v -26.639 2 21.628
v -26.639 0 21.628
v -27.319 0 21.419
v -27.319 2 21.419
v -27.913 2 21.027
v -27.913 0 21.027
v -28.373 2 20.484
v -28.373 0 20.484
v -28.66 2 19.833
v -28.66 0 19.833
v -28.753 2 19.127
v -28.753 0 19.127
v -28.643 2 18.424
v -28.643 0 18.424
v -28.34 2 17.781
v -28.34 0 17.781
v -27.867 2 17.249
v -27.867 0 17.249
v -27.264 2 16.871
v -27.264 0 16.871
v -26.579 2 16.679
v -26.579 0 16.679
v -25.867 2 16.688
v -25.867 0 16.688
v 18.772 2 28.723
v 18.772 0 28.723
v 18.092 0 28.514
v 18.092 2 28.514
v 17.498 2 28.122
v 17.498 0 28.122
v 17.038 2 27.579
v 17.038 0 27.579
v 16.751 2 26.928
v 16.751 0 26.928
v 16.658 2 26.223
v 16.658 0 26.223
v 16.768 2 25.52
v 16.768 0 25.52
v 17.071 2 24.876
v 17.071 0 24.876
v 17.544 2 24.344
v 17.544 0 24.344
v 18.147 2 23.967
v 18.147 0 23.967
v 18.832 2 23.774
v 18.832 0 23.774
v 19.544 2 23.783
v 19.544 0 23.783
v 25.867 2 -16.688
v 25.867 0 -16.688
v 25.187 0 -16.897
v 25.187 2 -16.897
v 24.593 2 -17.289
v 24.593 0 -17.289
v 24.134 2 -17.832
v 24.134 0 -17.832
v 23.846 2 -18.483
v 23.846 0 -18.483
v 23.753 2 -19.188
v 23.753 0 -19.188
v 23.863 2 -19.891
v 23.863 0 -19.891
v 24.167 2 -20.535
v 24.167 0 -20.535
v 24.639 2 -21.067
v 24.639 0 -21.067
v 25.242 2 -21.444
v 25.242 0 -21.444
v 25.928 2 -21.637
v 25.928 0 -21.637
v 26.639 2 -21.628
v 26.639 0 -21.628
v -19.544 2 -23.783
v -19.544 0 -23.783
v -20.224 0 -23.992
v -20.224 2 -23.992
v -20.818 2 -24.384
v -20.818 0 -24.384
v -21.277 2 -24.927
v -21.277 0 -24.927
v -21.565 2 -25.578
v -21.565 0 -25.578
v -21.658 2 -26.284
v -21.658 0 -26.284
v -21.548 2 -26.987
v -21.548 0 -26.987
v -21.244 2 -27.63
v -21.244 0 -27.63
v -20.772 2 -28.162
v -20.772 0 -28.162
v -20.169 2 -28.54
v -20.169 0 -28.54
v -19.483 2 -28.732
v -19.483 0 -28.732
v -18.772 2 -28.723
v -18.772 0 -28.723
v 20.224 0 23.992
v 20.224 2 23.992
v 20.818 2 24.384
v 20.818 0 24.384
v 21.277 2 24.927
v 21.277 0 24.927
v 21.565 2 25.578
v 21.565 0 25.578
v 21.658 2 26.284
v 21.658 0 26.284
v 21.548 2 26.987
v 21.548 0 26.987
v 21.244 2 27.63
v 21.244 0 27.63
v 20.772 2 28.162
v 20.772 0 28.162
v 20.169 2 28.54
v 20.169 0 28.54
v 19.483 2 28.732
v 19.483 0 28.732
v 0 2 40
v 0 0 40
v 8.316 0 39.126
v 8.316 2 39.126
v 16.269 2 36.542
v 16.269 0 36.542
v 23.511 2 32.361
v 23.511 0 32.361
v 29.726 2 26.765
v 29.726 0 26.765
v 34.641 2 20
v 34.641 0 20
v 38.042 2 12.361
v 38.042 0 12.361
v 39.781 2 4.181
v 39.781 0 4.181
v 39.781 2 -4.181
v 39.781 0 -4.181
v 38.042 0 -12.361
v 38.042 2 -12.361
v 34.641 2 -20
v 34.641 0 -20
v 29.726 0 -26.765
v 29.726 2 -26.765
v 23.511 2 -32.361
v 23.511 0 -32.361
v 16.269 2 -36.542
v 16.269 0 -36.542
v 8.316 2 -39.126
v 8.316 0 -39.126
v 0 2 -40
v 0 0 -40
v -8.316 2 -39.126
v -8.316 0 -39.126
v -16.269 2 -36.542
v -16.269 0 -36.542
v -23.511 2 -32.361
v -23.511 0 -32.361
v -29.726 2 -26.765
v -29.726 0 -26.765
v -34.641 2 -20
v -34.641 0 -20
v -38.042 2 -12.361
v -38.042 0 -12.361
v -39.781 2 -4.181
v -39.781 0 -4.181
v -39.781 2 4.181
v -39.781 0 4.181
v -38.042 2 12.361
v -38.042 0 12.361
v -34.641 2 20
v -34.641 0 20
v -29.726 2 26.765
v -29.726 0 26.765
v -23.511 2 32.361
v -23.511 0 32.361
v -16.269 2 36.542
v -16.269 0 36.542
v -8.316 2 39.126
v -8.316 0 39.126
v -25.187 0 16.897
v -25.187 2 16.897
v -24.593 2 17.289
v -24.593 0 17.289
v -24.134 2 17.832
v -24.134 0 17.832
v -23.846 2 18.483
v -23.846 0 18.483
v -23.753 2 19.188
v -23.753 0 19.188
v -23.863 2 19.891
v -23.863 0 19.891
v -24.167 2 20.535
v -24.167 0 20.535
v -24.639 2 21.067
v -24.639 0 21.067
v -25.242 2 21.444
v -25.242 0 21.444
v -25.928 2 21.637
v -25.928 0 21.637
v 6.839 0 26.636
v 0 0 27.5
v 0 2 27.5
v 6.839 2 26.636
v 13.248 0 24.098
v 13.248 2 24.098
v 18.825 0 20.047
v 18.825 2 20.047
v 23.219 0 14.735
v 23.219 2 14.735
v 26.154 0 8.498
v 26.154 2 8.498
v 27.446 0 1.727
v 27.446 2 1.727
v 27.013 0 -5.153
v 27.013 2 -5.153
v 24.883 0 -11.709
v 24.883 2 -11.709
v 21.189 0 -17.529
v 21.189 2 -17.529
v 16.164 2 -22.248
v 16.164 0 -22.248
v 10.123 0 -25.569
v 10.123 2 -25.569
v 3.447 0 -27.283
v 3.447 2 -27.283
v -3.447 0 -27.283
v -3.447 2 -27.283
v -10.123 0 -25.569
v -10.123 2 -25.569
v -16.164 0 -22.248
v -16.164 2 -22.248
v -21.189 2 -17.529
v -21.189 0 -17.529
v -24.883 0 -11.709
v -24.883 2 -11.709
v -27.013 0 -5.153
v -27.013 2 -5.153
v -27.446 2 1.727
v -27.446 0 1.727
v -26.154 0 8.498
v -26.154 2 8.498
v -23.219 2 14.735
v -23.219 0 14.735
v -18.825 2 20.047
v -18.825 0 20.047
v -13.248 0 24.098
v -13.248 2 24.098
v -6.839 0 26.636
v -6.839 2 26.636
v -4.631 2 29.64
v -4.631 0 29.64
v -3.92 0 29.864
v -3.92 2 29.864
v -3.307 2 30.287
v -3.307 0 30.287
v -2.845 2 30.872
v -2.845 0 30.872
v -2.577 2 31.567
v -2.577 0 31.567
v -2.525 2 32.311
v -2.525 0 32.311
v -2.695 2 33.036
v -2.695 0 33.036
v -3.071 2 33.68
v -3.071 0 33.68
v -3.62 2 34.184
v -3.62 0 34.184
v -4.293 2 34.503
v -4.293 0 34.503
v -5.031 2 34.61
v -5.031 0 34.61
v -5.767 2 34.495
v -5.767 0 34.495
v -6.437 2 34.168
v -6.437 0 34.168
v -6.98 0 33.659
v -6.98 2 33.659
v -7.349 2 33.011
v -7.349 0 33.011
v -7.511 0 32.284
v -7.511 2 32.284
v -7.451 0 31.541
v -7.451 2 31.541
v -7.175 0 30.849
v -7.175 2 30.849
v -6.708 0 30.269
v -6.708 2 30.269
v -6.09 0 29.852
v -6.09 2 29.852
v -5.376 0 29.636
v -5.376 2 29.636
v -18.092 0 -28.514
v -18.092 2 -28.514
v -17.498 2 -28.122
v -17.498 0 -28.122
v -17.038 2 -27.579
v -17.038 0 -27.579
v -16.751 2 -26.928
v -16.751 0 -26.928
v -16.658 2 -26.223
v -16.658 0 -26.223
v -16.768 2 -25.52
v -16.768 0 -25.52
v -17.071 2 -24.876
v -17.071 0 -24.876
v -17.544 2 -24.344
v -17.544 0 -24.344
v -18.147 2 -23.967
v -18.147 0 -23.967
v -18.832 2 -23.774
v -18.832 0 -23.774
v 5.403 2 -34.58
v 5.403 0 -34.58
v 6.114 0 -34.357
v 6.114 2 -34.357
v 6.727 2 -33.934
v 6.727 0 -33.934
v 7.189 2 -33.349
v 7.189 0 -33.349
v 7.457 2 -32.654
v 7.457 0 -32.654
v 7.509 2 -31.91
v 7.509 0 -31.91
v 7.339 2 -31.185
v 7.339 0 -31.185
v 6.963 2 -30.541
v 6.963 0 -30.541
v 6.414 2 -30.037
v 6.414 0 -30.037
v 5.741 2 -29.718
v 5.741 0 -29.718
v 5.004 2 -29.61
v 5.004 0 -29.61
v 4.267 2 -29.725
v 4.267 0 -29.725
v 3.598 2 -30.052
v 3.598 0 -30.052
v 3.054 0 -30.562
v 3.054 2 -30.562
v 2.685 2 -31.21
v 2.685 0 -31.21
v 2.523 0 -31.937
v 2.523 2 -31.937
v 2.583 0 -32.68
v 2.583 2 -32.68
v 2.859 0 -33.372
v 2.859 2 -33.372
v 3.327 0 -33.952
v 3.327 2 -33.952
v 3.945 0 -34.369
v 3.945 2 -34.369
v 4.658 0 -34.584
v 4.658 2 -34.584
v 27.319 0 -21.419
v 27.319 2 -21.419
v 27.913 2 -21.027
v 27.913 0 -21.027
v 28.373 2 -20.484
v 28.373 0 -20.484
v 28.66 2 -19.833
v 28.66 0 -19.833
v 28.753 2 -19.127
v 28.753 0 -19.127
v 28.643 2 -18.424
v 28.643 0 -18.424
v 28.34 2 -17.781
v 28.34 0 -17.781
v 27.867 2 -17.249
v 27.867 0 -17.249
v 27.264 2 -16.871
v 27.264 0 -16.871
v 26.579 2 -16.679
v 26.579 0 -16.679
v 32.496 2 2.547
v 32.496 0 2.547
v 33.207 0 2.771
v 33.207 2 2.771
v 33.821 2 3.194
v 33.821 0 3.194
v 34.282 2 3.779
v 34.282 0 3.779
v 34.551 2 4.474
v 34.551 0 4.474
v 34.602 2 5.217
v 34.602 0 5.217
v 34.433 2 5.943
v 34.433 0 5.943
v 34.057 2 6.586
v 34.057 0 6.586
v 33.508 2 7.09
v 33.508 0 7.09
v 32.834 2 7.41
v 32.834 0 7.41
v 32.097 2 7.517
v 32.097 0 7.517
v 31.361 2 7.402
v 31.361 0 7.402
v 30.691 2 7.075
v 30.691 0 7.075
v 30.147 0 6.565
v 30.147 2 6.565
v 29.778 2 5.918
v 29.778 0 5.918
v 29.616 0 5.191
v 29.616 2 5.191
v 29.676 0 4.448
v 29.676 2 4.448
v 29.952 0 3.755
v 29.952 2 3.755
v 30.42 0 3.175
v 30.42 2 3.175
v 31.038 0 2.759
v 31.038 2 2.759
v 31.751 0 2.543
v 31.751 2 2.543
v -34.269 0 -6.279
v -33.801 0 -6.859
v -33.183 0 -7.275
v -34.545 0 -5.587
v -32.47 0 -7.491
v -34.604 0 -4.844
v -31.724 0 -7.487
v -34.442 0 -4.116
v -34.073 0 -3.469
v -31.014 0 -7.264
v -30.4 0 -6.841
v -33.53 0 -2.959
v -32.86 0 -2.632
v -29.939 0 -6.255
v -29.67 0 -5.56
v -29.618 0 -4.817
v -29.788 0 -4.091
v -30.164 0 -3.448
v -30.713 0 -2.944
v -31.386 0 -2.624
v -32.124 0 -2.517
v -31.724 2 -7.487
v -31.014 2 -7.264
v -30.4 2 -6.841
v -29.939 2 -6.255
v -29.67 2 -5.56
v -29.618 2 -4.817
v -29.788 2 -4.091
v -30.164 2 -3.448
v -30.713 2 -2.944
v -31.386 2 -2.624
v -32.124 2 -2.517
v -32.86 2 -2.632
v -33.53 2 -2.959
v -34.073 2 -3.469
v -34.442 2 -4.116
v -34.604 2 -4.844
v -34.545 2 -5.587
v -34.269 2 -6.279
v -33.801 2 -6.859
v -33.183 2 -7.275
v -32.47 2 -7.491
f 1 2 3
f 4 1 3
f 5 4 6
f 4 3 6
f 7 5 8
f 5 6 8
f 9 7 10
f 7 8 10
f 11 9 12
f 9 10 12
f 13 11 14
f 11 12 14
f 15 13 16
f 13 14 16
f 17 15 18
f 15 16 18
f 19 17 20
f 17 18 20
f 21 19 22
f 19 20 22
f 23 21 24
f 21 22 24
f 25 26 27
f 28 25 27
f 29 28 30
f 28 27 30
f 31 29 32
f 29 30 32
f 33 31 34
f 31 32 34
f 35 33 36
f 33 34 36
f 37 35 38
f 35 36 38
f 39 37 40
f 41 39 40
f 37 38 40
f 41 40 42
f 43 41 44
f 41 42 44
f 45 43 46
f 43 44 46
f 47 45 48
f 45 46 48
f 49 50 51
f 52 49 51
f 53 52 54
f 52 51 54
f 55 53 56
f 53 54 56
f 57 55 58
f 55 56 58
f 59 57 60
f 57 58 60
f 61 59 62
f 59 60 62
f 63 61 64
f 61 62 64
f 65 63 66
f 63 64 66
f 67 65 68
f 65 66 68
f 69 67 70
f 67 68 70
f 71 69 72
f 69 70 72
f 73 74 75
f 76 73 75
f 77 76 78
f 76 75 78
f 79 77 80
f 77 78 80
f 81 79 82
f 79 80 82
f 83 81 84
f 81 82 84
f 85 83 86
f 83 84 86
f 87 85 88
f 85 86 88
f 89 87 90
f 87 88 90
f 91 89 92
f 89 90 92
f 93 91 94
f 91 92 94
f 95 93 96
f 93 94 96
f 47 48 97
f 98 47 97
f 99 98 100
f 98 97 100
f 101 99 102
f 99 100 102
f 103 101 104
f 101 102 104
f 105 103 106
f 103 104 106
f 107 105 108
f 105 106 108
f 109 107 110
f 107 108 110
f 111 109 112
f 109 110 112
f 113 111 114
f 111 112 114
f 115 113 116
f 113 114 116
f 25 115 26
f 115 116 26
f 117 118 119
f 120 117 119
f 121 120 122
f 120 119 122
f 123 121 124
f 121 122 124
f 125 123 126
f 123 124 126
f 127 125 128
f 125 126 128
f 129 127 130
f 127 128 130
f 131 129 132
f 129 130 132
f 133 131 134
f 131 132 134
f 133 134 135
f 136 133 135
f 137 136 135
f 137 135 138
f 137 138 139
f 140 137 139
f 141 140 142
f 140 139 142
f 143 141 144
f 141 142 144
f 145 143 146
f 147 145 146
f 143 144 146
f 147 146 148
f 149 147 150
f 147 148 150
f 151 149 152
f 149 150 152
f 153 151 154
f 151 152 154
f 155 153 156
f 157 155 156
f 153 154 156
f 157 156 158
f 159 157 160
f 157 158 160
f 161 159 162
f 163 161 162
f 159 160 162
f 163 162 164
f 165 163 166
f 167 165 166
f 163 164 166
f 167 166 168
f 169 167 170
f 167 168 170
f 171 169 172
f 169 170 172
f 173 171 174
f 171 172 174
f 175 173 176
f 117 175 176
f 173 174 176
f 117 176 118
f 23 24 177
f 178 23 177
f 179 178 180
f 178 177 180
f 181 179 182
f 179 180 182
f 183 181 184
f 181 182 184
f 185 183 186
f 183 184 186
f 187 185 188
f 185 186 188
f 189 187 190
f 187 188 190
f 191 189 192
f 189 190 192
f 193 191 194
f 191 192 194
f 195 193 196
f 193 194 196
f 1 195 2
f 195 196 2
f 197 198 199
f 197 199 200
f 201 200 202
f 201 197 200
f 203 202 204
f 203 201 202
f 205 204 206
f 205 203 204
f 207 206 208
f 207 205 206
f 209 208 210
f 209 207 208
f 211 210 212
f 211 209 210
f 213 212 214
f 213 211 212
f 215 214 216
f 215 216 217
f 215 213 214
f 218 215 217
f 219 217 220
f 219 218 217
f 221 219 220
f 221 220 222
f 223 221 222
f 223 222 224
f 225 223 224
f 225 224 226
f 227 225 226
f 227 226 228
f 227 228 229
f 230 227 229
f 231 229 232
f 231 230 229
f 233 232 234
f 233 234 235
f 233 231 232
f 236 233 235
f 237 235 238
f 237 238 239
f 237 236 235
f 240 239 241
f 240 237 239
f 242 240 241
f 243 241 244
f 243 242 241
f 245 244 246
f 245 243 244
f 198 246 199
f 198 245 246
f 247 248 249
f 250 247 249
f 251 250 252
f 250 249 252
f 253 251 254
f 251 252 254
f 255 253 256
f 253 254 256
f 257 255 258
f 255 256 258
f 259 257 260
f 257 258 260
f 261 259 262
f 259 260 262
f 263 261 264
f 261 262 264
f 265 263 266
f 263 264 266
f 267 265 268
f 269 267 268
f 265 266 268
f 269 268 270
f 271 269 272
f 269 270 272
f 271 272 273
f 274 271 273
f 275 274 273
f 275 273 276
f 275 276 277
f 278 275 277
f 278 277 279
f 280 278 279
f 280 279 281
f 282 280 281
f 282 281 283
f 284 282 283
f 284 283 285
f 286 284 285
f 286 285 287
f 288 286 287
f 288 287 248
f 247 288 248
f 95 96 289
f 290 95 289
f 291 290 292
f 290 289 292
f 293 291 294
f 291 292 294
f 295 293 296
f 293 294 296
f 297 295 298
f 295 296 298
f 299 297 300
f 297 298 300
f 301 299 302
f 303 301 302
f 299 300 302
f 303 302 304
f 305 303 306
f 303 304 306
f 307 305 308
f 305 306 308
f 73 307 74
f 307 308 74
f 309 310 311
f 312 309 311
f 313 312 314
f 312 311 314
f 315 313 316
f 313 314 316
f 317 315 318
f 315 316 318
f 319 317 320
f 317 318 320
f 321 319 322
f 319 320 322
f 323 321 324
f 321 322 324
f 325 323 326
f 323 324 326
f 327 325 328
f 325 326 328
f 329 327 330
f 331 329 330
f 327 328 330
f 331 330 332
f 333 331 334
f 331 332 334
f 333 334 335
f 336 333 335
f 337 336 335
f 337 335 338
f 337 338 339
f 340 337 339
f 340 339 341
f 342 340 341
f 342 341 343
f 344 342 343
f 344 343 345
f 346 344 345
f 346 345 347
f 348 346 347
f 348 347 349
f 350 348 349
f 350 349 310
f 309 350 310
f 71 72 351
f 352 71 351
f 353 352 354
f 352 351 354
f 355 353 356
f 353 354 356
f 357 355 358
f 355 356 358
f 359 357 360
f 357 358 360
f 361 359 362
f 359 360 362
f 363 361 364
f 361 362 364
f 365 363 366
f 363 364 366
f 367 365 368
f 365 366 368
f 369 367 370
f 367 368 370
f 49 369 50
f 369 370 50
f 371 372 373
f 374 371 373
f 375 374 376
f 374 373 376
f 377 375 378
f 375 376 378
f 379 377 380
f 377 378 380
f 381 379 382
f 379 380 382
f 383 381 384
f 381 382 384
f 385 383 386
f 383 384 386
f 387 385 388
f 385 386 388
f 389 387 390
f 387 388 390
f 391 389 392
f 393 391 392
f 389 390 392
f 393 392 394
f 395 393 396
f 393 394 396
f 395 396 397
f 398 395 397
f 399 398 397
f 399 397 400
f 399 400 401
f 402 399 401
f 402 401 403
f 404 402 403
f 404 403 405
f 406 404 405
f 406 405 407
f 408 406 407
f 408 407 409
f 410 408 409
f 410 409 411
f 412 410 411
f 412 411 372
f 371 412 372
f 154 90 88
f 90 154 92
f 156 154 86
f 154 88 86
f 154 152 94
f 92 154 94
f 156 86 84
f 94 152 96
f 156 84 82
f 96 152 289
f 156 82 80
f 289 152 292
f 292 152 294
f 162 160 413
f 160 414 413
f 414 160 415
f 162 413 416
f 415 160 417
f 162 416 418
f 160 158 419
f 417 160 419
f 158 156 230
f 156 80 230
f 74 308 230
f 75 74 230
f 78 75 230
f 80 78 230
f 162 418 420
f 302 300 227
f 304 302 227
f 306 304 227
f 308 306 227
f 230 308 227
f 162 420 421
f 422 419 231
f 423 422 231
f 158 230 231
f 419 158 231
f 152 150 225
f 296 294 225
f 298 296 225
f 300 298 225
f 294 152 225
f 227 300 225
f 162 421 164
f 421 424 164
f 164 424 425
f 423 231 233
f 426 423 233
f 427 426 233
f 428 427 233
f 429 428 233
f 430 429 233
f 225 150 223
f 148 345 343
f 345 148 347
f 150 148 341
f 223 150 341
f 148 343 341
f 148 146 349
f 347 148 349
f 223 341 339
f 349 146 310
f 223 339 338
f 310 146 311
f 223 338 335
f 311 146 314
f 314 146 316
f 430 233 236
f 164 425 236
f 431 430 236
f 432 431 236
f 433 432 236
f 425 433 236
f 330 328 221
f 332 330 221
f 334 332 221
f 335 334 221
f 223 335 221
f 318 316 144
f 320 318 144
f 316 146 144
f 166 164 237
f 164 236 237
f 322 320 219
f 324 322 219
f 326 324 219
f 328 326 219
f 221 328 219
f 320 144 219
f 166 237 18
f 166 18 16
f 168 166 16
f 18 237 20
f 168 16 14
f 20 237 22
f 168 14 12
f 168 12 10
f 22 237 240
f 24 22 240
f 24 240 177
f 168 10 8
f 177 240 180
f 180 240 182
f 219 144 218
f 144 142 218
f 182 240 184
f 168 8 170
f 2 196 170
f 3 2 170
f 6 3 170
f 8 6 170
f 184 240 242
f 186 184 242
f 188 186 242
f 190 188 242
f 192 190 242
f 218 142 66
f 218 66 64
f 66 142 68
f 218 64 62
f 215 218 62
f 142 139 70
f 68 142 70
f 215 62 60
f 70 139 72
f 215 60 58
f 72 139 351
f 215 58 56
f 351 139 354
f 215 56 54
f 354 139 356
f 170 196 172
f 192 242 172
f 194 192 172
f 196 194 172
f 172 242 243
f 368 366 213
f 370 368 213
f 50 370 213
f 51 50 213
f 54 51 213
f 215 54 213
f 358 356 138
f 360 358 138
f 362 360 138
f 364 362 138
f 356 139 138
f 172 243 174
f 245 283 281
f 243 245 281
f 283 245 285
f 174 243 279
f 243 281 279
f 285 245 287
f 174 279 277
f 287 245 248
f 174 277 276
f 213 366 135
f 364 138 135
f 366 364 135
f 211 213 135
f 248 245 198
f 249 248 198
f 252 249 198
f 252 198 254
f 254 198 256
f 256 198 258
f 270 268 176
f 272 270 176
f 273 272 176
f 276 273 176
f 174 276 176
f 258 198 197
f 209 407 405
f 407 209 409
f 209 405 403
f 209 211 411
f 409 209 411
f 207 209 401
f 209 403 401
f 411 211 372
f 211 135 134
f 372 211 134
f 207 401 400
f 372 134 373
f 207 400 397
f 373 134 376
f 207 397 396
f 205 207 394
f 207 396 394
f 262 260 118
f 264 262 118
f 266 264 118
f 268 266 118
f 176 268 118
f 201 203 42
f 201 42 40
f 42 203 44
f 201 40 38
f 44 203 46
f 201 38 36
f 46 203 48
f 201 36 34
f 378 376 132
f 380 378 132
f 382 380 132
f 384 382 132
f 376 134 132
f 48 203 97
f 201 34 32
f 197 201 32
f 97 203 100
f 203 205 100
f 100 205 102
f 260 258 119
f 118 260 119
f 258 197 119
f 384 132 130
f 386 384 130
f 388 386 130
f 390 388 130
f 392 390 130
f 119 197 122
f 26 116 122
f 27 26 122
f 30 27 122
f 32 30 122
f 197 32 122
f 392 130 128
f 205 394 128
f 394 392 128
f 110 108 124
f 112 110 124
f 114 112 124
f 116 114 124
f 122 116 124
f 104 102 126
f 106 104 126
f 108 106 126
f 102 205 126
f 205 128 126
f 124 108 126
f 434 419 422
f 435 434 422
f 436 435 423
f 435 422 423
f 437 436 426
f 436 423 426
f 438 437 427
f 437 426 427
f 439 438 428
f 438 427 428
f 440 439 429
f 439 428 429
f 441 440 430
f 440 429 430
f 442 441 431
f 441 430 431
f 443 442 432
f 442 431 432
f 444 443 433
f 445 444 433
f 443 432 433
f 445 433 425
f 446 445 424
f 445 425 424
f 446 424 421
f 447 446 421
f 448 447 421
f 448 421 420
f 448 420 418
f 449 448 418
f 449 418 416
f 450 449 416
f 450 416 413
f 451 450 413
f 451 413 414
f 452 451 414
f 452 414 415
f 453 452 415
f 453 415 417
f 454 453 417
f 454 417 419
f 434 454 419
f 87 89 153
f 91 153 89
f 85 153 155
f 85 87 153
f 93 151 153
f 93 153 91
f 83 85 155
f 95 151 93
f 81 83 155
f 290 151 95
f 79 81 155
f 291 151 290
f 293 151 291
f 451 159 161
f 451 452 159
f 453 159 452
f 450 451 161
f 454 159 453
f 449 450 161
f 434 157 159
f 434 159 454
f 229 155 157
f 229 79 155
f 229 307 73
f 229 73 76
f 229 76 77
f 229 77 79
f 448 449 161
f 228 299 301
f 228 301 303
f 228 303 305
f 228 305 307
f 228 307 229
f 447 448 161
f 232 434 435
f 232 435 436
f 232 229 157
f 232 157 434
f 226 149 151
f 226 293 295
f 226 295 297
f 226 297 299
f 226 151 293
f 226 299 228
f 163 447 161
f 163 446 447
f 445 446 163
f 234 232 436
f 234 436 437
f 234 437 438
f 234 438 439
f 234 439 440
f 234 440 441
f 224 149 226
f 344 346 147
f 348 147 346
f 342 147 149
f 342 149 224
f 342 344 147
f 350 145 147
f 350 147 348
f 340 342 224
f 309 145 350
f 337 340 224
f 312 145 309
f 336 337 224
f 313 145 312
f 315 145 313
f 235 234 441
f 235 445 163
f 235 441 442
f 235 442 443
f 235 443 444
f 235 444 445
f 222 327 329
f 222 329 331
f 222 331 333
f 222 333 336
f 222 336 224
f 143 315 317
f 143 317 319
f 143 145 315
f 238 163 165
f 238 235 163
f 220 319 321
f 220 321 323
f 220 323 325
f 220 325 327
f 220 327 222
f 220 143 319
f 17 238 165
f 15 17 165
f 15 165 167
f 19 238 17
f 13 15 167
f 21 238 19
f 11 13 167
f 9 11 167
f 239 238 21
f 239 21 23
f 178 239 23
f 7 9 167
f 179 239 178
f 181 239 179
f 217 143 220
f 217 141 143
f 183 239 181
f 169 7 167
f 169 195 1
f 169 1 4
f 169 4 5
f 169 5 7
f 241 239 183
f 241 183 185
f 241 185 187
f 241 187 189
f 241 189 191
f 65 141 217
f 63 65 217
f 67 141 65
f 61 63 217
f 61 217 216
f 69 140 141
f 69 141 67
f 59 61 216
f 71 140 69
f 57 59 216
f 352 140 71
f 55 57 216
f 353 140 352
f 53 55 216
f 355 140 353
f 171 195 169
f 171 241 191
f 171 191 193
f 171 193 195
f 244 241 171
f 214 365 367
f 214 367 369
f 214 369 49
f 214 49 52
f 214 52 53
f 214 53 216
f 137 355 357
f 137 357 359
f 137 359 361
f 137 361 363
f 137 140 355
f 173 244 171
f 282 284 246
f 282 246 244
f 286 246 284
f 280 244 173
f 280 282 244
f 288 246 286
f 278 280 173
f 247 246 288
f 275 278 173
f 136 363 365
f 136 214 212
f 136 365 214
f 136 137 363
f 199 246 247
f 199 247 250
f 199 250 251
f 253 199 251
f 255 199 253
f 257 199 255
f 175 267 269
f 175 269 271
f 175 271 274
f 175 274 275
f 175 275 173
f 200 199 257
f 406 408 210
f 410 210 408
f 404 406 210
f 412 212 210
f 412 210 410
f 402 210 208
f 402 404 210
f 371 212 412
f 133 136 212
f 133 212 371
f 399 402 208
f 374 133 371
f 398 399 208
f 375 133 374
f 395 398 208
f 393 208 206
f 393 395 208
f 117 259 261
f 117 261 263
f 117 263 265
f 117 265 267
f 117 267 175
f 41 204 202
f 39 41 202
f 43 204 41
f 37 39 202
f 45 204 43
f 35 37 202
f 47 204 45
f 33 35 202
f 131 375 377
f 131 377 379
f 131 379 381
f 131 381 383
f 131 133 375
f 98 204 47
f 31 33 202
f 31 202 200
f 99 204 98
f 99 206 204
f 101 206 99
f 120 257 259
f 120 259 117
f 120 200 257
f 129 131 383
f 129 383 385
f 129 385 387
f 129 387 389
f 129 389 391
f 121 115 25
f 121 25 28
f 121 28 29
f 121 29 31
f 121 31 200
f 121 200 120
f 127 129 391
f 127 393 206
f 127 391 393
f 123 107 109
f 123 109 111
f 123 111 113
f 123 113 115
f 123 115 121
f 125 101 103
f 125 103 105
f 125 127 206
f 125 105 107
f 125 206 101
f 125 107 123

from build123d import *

# Parameters (mm, degrees)
SKETCH_1_R          = 40
SKETCH_1_R_2        = 27.5
EXTRUDE_1_DEPTH     = 2
CUT_EXTRUDE_1_DEPTH = 5


with BuildPart() as part:
    # 草图1 → 凸台-拉伸1 (new body)
    with BuildSketch(Plane(origin=(0, 0, 0), x_dir=(1, 0, 0), z_dir=(0, 1, 0))):
        with Locations(Location((0, 0, 0), (0, 0, 270))):
            Circle(SKETCH_1_R)
        with Locations(Location((0, 0, 0), (0, 0, 270))):
            Circle(SKETCH_1_R_2, mode=Mode.SUBTRACT)
    extrude(amount=EXTRUDE_1_DEPTH)

    # 草图2 → 切除-拉伸1 (cut)
    with BuildSketch(Plane.XZ):
        with BuildLine():
            ThreePointArc((-32.496342046, -2.547106912), (-34.580439739, -5.403072039), (-31.724474612, -7.487169732))
            ThreePointArc((-31.724474612, -7.487169732), (-29.640376919, -4.631204605), (-32.496342046, -2.547106912))
        make_face()
        with BuildLine():
            ThreePointArc((-26.639073723, 21.627866356), (-28.723171416, 18.771901229), (-25.867206289, 16.687803537))
            ThreePointArc((-25.867206289, 16.687803537), (-23.783108596, 19.543768664), (-26.639073723, 21.627866356))
        make_face()
        with BuildLine():
            ThreePointArc((-5.403072039, 34.580439739), (-7.487169732, 31.724474612), (-4.631204605, 29.640376919))
            ThreePointArc((-4.631204605, 29.640376919), (-2.547106912, 32.496342046), (-5.403072039, 34.580439739))
        make_face()
        with BuildLine():
            ThreePointArc((18.771901229, 28.723171416), (16.687803537, 25.867206289), (19.543768664, 23.783108596))
            ThreePointArc((19.543768664, 23.783108596), (21.627866356, 26.639073723), (18.771901229, 28.723171416))
        make_face()
        with BuildLine():
            ThreePointArc((31.724474612, 7.487169732), (29.640376919, 4.631204605), (32.496342046, 2.547106912))
            ThreePointArc((32.496342046, 2.547106912), (34.580439739, 5.403072039), (31.724474612, 7.487169732))
        make_face()
        with BuildLine():
            ThreePointArc((25.867206289, -16.687803537), (23.783108596, -19.543768664), (26.639073723, -21.627866356))
            ThreePointArc((26.639073723, -21.627866356), (28.723171416, -18.771901229), (25.867206289, -16.687803537))
        make_face()
        with BuildLine():
            ThreePointArc((-19.543768664, -23.783108596), (-21.627866356, -26.639073723), (-18.771901229, -28.723171416))
            ThreePointArc((-18.771901229, -28.723171416), (-16.687803537, -25.867206289), (-19.543768664, -23.783108596))
        make_face()
        with BuildLine():
            ThreePointArc((4.631204605, -29.640376919), (2.547106912, -32.496342046), (5.403072039, -34.580439739))
            ThreePointArc((5.403072039, -34.580439739), (7.487169732, -31.724474612), (4.631204605, -29.640376919))
        make_face()
    extrude(amount=-CUT_EXTRUDE_1_DEPTH, mode=Mode.SUBTRACT)


solid = part.part
